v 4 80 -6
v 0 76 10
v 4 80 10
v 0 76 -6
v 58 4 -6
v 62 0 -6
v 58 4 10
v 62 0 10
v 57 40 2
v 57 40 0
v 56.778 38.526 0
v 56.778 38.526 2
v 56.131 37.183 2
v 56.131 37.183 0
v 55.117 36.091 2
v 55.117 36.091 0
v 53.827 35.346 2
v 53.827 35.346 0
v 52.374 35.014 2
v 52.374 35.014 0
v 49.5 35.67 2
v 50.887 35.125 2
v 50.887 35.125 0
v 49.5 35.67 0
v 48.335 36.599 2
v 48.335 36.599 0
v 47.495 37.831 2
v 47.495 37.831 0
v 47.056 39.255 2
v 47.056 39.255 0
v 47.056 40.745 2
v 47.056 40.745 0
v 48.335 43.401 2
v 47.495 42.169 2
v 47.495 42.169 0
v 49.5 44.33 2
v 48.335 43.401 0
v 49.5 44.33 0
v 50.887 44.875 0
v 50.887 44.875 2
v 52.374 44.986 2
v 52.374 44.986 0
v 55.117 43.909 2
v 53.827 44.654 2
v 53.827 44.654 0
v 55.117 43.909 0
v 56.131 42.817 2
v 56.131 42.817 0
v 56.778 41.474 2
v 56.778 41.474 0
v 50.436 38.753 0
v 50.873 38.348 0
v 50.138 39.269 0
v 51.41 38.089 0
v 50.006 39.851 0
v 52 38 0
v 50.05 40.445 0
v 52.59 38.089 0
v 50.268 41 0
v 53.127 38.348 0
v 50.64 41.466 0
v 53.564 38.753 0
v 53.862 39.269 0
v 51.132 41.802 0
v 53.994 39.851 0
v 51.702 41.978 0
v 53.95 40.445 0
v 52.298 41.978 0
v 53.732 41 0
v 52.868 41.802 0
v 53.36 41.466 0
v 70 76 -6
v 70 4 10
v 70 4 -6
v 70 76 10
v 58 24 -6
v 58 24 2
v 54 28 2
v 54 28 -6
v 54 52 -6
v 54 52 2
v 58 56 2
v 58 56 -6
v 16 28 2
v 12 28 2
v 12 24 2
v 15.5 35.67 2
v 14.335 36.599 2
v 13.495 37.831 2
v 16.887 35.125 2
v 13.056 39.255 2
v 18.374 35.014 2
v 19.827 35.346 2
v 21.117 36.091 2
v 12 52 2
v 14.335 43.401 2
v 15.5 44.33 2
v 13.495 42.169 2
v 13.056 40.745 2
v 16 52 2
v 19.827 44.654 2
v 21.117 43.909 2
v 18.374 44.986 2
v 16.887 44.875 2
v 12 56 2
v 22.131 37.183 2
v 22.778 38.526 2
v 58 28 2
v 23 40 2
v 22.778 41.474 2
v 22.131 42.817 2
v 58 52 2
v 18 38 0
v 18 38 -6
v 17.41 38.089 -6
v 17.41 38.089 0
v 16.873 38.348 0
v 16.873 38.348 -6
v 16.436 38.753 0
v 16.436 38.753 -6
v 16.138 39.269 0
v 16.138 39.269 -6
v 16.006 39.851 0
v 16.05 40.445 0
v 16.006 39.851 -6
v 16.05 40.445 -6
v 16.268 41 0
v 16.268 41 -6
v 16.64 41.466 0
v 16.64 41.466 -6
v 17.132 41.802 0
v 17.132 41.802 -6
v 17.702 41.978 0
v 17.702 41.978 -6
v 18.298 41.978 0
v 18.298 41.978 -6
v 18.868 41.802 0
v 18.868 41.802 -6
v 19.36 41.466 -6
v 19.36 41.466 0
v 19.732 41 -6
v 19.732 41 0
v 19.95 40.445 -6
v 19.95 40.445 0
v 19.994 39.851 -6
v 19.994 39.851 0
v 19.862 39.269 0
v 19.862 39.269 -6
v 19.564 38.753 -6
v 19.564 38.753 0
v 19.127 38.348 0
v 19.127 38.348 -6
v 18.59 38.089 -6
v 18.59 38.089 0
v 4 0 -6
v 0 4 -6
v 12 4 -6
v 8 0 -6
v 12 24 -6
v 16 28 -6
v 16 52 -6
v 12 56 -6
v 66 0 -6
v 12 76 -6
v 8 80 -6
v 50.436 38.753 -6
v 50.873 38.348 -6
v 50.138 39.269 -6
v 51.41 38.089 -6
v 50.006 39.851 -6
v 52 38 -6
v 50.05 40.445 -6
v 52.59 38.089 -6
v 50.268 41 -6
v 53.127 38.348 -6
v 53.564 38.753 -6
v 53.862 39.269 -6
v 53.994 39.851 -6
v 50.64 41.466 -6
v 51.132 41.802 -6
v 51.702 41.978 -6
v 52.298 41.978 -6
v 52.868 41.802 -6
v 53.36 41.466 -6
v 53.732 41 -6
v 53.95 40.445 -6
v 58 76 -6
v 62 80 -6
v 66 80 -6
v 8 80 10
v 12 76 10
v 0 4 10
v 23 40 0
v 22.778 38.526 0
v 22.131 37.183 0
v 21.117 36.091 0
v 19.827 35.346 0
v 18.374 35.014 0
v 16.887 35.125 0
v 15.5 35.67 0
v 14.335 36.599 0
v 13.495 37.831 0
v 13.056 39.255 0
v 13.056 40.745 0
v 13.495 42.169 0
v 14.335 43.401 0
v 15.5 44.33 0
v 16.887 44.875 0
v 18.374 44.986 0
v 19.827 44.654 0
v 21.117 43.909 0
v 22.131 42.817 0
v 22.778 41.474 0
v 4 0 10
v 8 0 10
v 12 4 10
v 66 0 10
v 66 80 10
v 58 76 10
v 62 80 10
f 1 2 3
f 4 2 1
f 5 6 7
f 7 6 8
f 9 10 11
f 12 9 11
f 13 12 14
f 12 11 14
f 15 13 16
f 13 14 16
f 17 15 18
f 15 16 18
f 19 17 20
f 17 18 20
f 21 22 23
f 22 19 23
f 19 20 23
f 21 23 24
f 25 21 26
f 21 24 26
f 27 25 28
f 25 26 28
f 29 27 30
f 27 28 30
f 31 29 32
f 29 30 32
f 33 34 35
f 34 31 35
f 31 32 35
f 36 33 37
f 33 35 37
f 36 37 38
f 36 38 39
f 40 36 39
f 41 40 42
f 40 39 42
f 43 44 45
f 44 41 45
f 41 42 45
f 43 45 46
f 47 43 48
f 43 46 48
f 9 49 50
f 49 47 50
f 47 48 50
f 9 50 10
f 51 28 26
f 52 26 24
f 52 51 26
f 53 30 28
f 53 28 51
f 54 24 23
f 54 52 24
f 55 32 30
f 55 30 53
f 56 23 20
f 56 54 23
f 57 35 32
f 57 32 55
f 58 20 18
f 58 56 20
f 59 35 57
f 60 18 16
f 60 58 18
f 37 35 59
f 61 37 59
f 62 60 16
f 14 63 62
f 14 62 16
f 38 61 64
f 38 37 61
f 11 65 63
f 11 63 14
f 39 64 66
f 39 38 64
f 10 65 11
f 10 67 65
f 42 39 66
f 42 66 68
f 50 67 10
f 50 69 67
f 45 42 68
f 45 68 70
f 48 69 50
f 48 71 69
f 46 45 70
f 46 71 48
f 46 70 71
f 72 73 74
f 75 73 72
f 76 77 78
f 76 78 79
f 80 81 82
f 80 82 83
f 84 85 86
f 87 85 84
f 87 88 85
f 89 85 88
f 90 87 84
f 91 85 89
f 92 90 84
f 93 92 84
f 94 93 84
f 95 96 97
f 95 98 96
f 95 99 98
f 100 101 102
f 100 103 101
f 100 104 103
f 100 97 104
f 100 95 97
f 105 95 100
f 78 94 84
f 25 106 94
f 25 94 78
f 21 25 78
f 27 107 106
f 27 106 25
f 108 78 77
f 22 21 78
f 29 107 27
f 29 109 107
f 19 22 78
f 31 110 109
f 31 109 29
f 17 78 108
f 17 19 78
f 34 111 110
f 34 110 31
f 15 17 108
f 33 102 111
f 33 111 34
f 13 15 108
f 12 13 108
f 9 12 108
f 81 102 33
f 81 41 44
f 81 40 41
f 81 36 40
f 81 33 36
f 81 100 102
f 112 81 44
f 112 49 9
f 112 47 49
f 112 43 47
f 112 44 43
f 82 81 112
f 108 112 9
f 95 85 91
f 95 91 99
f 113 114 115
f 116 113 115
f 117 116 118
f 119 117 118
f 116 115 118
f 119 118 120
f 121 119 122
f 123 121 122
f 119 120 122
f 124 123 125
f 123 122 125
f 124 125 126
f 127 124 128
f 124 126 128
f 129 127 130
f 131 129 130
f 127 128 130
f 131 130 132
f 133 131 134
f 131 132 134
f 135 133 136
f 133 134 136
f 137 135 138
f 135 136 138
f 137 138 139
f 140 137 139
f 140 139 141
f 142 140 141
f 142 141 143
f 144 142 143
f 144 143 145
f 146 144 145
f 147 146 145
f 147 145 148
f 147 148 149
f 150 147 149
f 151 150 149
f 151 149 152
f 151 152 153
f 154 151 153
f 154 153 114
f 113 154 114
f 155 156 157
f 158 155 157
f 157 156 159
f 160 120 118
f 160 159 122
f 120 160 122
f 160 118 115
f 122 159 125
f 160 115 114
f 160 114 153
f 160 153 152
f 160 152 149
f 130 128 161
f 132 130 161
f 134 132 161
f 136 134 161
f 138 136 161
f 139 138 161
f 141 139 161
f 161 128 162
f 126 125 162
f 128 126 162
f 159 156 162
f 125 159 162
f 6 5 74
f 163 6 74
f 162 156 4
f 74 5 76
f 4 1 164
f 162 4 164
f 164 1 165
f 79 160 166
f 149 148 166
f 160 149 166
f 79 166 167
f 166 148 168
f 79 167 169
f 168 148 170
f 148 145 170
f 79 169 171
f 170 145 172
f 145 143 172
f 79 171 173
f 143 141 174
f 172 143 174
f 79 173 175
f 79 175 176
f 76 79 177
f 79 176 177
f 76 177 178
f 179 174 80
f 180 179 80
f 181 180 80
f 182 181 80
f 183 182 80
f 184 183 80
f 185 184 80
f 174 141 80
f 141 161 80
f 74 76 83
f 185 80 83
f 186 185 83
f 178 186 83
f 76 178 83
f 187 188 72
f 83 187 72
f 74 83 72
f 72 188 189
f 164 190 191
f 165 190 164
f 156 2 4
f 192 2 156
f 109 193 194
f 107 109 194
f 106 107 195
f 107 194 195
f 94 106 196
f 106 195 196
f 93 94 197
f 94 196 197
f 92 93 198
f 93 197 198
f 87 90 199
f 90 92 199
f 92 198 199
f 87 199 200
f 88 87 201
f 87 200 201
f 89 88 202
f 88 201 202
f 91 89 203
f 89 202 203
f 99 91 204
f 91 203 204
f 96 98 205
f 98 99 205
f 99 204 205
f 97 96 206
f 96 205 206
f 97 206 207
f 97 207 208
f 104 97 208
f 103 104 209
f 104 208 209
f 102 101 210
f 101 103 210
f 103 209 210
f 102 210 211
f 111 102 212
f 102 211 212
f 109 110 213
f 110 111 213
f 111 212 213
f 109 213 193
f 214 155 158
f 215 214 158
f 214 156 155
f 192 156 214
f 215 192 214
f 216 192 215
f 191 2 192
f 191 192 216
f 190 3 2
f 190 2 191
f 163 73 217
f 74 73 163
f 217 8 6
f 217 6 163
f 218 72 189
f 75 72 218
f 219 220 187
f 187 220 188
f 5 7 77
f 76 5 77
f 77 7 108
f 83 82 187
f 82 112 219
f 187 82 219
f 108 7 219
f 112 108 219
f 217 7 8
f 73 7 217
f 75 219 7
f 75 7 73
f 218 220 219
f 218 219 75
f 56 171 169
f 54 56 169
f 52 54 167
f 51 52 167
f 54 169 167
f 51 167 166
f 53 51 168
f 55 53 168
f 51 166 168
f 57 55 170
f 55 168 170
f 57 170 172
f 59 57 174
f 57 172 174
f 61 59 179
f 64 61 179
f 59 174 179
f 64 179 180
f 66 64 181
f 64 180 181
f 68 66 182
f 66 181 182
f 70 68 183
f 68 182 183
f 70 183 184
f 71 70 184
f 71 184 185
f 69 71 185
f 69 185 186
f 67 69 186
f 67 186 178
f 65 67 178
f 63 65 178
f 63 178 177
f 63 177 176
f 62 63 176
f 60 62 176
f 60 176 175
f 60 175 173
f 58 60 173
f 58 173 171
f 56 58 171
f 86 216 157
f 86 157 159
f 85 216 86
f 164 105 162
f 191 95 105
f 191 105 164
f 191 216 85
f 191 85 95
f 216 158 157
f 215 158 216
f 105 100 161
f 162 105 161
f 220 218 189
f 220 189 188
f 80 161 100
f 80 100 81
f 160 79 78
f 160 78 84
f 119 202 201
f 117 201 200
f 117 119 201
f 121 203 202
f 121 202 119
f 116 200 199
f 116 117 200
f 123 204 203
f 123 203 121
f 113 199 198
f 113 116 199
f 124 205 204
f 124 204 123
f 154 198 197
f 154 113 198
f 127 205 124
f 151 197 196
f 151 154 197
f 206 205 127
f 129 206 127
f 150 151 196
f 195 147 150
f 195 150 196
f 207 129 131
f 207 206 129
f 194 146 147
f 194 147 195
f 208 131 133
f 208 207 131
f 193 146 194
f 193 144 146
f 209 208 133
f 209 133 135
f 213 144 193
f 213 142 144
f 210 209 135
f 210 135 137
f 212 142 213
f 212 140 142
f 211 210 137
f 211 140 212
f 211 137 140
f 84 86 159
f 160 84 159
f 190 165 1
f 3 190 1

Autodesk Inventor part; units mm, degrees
ref_plane "YZ Plane" through (0, 0, 0) normal (1, 0, 0) x (0, 1, 0)
ref_plane "XZ Plane" through (0, 0, 0) normal (0, 1, 0) x (-1, 0, 0)
ref_plane "XY Plane" through (0, 0, 0) normal (0, 0, 1) x (1, 0, 0)
sketch "Sketch1" plane through (0, 0, 0) normal (0, 0, 1) x (1, 0, 0)
  line L0 (0, 0) -> (70, 0)
  line L1 (70, 0) -> (70, 80)
  line L2 (70, 80) -> (0, 80)
  line L3 (0, 80) -> (0, 0)
  line L4 (12, 80) -> (58, 80)
  line L5 (58, 80) -> (58, 0)
  line L6 (58, 0) -> (12, 0)
  line L7 (12, 0) -> (12, 80)
  point P0 (18, 40)
  point P1 (52, 40)
  point P2 (12, 0)
  dimension "d0" = 70
  dimension "d1" = 80
  dimension "d2" = 34
  dimension "d3" = 18
  dimension "d6" = 40
  dimension "d7" = 40
  dimension "d8" = 12
  dimension "d9" = 12
extrude "Extrusion1" add sketch "Sketch1" against normal blind 6
extrude "Extrusion2" add sketch "Sketch1" along normal blind 10 contours L3 L2 L7 L0 | L5 L2 L1 L0
hole "Hole1" at (18, 40, 0) at (52, 40, 0) direction (0, 0, -1) diameter 4 depth 6
sketch "Sketch2" plane through (0, 0, 0) normal (0, 0, 1) x (1, 0, 0)
  line L0 (12, 0) -> (12, 80) projected
  line L1 (58, 0) -> (58, 80) projected
  line L2 (12, 0) -> (58, 0)
  line L3 (58, 0) -> (58, 28)
  line L4 (58, 28) -> (12, 28)
  line L5 (12, 28) -> (12, 0)
  line L6 (58, 80) -> (12, 80) projected
  line L7 (12, 80) -> (58, 80)
  line L8 (58, 80) -> (58, 52)
  line L9 (58, 52) -> (12, 52)
  line L10 (12, 52) -> (12, 80)
  point P0 (0, 0)
  point P1 (12, 52)
  dimension "d24" = 24
  dimension "d25" = 28
extrude "Extrusion3" cut sketch "Sketch2" against normal blind 6 contours L0 L4 L1 L2 | L0 L6 L1 L9
sketch "Sketch3" plane through (0, 0, 0) normal (0, 0, 1) x (1, 0, 0)
  line L0 (58, 28) -> (12, 28) projected
  line L1 (12, 52) -> (58, 52) projected
  line L2 (58, 28) -> (12, 28)
  line L3 (12, 28) -> (12, 52)
  line L4 (12, 52) -> (58, 52)
  line L5 (58, 52) -> (58, 28)
  circle A0 centre (52, 40) radius 2 projected
  circle A1 centre (52, 40) radius 5
  circle A2 centre (18, 40) radius 2 projected
  circle A3 centre (18, 40) radius 5
  point P0 (0, 0)
  dimension "d28" = 10
  dimension "d29" = 10
extrude "Extrusion4" add sketch "Sketch3" along normal blind 2 contours L0 L3 L1 L5
chamfer "Chamfer2" distance 4 angle 45 12 edges at (58, 0, 2) (70, 0, 2) (12, 0, 2) (0, 0, 2) (70, 80, 2) (58, 80, 2) (12, 80, 2) (0, 80, 2) (58, 52, -2) (12, 52, -2) (58, 28, -2) (12, 28, -2)
properties part number "Fan_feet_3DPrint"
